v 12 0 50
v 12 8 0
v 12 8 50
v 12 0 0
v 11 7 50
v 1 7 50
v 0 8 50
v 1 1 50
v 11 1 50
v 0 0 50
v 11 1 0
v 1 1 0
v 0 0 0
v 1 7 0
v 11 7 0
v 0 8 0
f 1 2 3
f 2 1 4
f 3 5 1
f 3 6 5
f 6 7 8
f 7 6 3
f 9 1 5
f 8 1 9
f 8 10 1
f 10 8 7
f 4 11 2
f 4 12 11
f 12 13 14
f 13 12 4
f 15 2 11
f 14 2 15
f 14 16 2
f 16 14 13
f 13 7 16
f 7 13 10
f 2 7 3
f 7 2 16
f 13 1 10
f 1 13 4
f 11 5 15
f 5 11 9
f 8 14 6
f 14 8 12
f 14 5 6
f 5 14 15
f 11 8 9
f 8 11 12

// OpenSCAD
$fn = 64;

outer_w = 12;   // mm
outer_h = 8;    // mm
wall    = 1;    // mm
length  = 50;   // mm (default extrusion length)

inner_w = outer_w - 2*wall;
inner_h = outer_h - 2*wall;

difference() {
    cube([outer_w, outer_h, length], center=false);
    translate([wall, wall, -0.1])
        cube([inner_w, inner_h, length + 0.2], center=false);
}
